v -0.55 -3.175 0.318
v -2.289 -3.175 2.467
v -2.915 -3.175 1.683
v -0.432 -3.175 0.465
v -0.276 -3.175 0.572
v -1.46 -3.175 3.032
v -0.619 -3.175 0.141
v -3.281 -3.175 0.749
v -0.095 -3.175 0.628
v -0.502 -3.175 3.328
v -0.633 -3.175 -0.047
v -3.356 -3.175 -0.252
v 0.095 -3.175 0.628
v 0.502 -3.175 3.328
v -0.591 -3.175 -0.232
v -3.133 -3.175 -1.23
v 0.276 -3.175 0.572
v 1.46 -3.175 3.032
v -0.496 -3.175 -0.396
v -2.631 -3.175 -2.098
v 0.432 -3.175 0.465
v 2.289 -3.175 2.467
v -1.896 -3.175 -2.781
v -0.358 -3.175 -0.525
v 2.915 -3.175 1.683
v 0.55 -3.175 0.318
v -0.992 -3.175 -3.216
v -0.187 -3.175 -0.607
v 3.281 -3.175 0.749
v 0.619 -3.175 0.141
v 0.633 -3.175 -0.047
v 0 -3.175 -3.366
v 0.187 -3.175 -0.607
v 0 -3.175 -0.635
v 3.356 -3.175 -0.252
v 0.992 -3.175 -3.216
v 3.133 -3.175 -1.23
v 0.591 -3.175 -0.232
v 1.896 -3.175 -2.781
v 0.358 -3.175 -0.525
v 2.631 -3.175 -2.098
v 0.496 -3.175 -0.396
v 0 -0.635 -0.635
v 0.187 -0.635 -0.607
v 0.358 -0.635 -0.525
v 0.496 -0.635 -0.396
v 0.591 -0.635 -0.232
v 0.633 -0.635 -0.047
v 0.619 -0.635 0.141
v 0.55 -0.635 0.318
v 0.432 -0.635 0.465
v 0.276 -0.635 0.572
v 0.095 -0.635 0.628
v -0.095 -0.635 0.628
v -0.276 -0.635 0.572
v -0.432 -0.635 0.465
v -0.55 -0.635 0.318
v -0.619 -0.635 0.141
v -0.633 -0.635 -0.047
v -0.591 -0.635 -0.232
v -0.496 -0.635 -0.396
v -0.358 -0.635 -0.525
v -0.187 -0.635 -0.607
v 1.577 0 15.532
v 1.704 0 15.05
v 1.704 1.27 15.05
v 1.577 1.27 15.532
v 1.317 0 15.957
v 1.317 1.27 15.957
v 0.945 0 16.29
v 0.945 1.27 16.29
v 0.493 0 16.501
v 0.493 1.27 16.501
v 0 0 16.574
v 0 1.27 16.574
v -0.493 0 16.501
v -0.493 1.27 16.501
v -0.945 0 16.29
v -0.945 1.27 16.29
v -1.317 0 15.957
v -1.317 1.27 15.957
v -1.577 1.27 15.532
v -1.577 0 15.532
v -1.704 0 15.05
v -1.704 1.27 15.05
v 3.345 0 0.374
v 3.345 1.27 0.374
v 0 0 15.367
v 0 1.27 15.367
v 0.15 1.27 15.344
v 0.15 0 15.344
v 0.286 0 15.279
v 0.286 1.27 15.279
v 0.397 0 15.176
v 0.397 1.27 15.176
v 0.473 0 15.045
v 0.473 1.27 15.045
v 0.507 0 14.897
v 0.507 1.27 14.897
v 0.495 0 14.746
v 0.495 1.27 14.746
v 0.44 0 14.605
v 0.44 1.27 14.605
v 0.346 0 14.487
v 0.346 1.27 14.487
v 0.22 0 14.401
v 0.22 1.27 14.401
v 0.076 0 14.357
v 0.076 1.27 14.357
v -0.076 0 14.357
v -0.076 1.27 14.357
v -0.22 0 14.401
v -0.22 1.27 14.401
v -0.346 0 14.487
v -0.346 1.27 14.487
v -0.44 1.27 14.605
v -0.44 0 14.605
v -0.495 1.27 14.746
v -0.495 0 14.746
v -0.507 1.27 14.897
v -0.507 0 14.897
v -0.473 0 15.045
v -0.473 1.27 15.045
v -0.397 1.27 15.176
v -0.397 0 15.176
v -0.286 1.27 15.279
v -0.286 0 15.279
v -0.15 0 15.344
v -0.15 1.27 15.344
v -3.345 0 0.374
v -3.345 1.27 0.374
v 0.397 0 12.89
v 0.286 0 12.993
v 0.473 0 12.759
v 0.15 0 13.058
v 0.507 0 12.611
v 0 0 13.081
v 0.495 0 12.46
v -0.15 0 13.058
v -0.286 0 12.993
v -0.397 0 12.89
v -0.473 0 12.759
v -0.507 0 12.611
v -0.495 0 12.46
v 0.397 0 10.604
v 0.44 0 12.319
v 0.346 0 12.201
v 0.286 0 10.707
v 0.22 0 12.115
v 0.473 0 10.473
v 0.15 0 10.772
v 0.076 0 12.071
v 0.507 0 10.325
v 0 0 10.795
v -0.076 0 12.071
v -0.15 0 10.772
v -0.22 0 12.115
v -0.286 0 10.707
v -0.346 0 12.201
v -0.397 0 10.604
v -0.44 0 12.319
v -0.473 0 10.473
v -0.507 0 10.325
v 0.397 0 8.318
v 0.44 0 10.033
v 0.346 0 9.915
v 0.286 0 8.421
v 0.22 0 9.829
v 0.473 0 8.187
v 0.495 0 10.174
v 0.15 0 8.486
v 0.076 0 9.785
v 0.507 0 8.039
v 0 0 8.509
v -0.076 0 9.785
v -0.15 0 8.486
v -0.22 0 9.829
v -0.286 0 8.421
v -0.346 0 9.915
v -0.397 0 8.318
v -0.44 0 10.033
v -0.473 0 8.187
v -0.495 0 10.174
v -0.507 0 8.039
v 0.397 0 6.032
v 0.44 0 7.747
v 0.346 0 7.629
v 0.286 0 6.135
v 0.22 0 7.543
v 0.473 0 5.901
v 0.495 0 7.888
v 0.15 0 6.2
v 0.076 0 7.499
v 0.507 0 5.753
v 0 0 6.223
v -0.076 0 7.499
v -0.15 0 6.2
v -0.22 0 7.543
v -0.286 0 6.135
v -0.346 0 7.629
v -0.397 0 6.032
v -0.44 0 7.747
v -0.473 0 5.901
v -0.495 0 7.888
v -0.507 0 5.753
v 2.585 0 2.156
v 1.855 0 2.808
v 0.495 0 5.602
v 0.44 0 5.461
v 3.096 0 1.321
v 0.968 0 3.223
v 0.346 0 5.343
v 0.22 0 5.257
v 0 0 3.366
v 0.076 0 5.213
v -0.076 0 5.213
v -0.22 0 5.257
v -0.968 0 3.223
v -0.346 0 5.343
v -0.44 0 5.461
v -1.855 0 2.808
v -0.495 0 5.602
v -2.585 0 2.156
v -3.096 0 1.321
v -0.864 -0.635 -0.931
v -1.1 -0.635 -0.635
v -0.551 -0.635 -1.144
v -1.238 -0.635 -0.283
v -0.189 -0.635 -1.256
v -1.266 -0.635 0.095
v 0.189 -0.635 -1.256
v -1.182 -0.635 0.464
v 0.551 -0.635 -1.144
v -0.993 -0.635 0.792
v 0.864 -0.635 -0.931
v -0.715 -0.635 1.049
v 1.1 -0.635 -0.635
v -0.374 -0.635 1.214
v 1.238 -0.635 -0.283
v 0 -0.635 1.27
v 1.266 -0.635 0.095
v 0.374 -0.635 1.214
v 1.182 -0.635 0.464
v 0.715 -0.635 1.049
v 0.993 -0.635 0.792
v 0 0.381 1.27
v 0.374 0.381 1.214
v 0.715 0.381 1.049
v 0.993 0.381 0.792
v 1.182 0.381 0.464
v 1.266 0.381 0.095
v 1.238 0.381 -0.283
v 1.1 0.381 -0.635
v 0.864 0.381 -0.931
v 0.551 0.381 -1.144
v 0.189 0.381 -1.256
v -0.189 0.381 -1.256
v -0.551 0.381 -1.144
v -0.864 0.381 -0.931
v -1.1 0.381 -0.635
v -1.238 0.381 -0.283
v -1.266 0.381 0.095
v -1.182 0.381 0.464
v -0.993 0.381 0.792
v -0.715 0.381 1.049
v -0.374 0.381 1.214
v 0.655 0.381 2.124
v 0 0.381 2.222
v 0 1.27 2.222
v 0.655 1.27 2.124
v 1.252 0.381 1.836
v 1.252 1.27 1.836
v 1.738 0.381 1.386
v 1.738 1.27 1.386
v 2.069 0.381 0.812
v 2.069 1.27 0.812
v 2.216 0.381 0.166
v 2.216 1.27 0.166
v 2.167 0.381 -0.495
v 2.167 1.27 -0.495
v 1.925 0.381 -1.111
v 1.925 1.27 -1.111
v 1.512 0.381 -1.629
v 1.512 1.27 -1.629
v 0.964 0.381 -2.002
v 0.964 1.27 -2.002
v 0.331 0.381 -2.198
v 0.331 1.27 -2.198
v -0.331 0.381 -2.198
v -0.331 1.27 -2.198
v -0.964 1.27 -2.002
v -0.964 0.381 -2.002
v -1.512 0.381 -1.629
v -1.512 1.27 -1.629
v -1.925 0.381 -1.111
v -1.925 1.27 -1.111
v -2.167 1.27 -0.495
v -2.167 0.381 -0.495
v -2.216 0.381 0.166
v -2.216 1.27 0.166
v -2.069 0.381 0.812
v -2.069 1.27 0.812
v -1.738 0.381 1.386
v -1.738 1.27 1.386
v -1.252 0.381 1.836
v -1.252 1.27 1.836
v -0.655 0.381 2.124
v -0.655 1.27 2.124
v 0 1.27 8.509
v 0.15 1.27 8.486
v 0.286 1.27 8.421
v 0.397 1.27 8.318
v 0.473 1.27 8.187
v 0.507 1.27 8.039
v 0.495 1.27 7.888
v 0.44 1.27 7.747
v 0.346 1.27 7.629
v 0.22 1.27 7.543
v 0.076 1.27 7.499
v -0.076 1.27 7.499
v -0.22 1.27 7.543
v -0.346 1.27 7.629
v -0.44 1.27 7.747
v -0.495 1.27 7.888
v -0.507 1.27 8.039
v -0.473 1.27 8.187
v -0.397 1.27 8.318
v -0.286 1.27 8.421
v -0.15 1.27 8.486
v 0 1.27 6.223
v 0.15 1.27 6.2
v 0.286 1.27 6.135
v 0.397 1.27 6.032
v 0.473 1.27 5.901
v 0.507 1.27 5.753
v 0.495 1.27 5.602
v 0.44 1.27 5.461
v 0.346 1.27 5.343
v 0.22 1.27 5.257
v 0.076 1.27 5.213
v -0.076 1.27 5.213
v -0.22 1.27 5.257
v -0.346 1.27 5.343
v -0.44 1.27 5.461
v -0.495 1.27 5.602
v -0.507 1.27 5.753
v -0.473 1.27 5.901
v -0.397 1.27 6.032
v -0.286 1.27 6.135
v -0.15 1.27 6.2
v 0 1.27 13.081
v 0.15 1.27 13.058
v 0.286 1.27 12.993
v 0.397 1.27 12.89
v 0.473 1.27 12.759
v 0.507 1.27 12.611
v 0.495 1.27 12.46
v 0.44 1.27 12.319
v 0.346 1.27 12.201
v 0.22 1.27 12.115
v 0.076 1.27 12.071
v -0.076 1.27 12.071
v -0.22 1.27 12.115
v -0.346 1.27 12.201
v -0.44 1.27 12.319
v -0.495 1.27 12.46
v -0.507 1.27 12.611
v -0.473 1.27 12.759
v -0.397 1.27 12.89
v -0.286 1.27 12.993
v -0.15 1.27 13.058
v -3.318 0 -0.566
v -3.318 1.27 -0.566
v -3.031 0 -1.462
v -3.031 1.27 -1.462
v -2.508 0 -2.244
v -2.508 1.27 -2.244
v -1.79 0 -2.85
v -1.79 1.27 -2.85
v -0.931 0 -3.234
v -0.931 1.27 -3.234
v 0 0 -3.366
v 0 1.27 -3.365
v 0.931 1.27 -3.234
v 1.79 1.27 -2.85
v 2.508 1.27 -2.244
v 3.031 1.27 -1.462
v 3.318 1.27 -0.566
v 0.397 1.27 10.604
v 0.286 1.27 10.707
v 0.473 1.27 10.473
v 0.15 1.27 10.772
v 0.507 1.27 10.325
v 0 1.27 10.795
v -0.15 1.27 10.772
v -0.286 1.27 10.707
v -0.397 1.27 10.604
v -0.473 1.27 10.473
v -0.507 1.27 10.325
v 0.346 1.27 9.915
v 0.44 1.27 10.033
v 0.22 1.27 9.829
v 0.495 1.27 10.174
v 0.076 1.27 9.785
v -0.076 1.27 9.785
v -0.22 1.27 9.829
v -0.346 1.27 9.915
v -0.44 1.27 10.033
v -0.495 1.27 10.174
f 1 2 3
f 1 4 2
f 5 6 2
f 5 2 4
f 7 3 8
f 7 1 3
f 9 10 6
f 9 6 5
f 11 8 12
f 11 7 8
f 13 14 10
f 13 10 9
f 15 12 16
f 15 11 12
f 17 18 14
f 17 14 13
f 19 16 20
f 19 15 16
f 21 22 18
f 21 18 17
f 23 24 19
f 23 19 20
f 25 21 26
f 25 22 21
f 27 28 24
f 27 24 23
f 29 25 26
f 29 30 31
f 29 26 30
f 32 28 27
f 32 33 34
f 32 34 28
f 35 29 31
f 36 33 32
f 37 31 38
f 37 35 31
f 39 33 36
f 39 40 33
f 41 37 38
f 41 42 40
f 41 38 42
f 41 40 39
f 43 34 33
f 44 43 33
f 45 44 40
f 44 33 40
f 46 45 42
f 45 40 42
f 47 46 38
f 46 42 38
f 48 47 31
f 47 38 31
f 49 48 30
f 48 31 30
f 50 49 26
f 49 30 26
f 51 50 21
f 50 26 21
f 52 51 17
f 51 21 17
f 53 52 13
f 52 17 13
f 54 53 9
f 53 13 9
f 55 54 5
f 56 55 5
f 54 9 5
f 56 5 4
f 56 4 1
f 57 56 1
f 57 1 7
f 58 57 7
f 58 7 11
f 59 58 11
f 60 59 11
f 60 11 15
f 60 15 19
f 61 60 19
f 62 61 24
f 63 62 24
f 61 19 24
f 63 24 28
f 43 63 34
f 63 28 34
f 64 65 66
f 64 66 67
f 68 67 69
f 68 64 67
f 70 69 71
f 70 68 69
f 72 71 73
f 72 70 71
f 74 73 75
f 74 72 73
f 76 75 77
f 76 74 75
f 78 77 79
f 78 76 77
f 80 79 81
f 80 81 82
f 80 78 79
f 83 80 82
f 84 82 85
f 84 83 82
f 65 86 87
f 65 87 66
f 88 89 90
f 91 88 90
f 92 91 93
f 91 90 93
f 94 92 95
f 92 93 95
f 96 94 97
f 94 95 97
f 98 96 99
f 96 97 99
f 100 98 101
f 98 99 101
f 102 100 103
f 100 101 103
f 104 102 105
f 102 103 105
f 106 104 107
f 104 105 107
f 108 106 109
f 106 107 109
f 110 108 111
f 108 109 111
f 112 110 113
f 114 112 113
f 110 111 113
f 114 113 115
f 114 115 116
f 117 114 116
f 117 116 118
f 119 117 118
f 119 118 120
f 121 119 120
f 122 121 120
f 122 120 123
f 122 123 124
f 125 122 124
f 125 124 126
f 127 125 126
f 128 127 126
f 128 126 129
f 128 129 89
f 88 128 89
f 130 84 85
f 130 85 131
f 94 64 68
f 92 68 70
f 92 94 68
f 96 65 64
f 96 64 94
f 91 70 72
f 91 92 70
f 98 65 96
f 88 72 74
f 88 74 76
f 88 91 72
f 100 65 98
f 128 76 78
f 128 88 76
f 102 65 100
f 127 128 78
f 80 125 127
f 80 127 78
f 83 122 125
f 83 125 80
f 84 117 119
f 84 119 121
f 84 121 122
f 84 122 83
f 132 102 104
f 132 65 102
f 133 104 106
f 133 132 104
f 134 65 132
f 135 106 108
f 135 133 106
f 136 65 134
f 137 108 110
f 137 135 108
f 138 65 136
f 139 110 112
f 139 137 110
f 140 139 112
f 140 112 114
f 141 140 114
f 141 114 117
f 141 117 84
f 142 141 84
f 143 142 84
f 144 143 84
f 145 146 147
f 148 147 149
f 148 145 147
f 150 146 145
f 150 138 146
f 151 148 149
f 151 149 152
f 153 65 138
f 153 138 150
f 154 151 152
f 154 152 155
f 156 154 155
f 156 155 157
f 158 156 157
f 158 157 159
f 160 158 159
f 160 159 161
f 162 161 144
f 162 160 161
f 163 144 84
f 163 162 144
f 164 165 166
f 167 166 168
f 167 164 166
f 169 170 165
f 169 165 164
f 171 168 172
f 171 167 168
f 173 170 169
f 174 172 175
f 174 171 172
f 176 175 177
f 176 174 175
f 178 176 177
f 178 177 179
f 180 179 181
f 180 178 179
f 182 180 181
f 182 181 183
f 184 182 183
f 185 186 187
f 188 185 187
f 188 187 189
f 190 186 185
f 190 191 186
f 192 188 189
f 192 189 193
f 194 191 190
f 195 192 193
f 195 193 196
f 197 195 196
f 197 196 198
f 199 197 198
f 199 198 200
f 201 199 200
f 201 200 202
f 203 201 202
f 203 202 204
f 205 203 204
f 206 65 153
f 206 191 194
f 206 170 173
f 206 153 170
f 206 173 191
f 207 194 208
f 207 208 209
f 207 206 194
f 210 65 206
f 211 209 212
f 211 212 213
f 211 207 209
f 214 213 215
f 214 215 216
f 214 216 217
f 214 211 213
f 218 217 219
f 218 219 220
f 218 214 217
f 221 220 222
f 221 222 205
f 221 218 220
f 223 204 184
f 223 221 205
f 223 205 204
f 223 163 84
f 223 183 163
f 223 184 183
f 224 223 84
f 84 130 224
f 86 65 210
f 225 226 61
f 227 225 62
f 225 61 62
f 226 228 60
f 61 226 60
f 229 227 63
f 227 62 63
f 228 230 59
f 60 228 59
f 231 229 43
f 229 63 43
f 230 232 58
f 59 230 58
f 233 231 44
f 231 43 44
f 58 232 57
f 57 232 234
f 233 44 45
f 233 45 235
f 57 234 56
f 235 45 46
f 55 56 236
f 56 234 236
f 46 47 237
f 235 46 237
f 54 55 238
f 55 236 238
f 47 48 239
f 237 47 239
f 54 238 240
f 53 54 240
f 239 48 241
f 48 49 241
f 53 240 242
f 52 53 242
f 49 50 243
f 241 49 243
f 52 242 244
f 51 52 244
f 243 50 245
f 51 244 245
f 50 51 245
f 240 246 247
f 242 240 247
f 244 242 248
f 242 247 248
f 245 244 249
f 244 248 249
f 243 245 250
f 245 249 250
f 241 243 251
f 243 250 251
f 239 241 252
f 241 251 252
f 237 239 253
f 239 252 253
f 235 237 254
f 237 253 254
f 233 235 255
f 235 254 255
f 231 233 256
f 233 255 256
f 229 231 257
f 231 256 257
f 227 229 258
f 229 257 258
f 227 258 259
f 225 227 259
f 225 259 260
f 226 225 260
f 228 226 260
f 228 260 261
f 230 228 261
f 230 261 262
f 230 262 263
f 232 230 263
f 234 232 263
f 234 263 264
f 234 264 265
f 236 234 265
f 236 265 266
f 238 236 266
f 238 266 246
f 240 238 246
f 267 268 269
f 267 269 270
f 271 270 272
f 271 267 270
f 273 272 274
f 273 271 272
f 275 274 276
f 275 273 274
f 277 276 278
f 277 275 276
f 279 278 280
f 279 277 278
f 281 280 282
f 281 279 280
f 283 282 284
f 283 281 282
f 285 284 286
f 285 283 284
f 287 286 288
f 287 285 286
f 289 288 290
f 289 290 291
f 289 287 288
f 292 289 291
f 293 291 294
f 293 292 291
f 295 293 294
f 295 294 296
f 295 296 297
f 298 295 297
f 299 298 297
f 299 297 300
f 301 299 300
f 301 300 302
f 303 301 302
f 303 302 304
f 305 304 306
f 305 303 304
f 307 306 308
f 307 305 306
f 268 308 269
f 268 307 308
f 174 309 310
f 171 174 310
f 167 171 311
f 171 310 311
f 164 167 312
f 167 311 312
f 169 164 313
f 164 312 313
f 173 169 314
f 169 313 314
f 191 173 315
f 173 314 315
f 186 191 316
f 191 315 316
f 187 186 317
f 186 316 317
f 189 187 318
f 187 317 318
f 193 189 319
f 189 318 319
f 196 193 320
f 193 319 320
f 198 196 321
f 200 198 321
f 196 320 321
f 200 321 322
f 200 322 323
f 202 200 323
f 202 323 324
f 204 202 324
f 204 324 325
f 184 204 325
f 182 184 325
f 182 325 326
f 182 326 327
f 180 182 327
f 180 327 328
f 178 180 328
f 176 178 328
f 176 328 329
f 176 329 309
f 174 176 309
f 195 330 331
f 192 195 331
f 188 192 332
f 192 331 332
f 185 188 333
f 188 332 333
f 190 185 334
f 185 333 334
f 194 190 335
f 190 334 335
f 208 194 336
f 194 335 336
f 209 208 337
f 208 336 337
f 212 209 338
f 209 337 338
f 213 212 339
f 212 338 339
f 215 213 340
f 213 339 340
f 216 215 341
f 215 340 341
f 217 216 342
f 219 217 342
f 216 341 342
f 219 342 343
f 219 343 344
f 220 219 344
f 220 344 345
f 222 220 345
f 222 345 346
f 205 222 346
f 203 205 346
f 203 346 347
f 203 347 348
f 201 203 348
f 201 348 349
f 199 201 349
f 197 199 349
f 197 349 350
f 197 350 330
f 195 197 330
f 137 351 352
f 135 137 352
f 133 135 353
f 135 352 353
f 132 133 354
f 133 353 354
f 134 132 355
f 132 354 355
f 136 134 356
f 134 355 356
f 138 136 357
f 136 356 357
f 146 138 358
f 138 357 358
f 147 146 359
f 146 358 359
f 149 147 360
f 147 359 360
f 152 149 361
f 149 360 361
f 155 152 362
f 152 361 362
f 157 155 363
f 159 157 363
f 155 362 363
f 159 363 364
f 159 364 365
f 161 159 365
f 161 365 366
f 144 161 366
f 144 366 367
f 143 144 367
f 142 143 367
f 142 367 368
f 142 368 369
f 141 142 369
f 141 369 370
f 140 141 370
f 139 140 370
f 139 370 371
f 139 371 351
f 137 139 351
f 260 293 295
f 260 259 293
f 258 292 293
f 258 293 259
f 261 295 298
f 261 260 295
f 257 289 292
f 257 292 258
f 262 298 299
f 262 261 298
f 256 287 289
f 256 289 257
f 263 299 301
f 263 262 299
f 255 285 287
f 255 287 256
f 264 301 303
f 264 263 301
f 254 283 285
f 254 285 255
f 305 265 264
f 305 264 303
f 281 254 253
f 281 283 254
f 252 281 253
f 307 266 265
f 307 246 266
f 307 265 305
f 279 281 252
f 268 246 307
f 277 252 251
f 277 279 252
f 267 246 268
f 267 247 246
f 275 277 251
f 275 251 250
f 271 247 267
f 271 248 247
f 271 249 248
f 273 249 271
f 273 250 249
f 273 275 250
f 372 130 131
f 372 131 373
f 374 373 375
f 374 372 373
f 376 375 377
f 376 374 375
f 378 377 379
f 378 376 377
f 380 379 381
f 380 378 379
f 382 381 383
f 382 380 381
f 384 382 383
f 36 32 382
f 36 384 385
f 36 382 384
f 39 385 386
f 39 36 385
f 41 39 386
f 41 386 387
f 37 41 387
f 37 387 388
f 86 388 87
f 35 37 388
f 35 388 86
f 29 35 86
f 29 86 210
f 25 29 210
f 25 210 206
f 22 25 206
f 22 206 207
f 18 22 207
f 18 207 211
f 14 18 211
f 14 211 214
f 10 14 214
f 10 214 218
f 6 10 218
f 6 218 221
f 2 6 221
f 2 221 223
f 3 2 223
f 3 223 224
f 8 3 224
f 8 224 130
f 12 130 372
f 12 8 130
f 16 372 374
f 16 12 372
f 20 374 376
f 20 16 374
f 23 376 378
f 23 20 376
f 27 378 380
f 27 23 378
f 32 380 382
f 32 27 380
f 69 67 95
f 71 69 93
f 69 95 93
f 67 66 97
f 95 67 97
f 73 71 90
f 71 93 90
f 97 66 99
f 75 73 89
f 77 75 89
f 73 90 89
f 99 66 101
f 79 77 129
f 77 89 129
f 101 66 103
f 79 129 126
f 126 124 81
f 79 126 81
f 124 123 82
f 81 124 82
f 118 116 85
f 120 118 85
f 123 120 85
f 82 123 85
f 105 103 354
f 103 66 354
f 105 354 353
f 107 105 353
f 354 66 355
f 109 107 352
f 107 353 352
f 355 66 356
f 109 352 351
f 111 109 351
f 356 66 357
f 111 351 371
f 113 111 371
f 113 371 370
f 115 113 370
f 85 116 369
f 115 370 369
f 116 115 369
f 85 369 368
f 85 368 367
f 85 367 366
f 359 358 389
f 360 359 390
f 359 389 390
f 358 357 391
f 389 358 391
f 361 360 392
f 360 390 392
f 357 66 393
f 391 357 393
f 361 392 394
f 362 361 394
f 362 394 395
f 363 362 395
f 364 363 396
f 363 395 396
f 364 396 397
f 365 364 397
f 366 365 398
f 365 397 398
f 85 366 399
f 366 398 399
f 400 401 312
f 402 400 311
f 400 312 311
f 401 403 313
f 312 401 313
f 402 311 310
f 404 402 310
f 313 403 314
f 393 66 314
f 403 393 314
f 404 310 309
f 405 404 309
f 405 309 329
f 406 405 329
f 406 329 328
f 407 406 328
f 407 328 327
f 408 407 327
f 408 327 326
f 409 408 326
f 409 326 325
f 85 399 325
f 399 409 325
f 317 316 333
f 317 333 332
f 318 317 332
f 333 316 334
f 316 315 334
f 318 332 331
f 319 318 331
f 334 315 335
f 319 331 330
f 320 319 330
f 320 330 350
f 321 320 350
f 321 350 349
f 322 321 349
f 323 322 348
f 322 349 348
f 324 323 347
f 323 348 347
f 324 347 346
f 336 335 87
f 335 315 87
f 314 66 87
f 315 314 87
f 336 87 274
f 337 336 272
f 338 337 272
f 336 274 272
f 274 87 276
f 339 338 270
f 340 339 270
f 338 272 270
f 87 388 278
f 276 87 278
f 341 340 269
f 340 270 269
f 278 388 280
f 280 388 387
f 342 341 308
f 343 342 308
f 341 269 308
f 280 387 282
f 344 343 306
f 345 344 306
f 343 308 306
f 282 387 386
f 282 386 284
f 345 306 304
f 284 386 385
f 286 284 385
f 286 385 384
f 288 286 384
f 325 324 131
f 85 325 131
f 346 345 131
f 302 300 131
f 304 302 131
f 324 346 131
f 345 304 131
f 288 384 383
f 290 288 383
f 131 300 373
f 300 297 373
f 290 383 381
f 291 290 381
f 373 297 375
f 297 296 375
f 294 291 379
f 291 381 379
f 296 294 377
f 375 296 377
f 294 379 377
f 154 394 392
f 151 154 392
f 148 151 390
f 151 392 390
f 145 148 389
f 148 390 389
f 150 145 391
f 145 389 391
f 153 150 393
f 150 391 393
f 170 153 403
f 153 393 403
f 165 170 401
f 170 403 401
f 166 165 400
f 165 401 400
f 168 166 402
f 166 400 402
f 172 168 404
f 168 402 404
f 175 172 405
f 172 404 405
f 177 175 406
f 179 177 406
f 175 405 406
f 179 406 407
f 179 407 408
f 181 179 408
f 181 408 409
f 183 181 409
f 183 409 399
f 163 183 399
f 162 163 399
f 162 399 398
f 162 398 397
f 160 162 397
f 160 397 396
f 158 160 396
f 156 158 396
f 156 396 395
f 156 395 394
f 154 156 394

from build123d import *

# Parameters (mm, degrees)
BOSS_EXTRUDE1_DEPTH = 1.27
BOSS_EXTRUDE2_START = 3.175
SKETCH2_R           = 3.3655
BOSS_EXTRUDE2_DEPTH = 3.175
CUT_EXTRUDE1_DEPTH  = 2.286
CUT_EXTRUDE2_START  = -0.889
SKETCH4_R           = 2.2225
CUT_EXTRUDE2_DEPTH  = 0.889
CUT_EXTRUDE3_REACH  = 19.282
SKETCH5_R           = 1.27
CUT_EXTRUDE4_REACH  = 19.486
SKETCH6_R           = 0.508
SKETCH7_R           = 2.54
SKETCH7_R_2         = 0.635
BOSS_EXTRUDE3_DEPTH = 2.54


with BuildPart() as part:
    # Sketch1 → Boss-Extrude1 (new body)
    with BuildSketch(Plane(origin=(0, 0, 0), x_dir=(1, 0, 0), z_dir=(0, 1, 0))):
        with BuildLine():
            Line((-1.703883799, -15.0495), (-3.34466079, -0.373944444))
            ThreePointArc((-3.34466079, -0.373944444), (0, 3.3655), (3.34466079, -0.373944444))
            Line((3.34466079, -0.373944444), (1.703883799, -15.0495))
            ThreePointArc((1.703883799, -15.0495), (0, -16.5735), (-1.703883799, -15.0495))
        make_face()
    extrude(amount=BOSS_EXTRUDE1_DEPTH)

    # Sketch2 → Boss-Extrude2 (add)
    with BuildSketch(Plane.XZ.offset(BOSS_EXTRUDE2_START)):
        with Locations(Location((0, 0, 0), (0, 0, 270))):
            Circle(SKETCH2_R)
    extrude(amount=-BOSS_EXTRUDE2_DEPTH)

    # Sketch3 → Cut-Extrude1 (cut)
    with BuildSketch(Plane(origin=(0, -3.175, 0), x_dir=(-1, 0, 0), z_dir=(0, -1, 0))):
        with BuildLine():
            Line((0.344662185, 2.452398872), (0.160511142, 2.216696286))
            ThreePointArc((0.160511142, 2.216696286), (0.155033763, 2.217086102), (0.149555438, 2.217462383))
            Line((0.149555438, 2.217462383), (0, 2.4765))
            Line((0, 2.4765), (-0.149555438, 2.217462383))
            ThreePointArc((-0.149555438, 2.217462383), (-0.155033763, 2.217086102), (-0.160511142, 2.216696286))
            Line((-0.160511142, 2.216696286), (-0.344662185, 2.452398872))
            Line((-0.344662185, 2.452398872), (-0.456711091, 2.175068098))
            ThreePointArc((-0.456711091, 2.175068098), (-0.462083733, 2.173933043), (-0.467453554, 2.172784717))
            Line((-0.467453554, 2.172784717), (-0.682615912, 2.38056459))
            Line((-0.682615912, 2.38056459), (-0.754977382, 2.090338586))
            ThreePointArc((-0.754977382, 2.090338586), (-0.760139769, 2.08846685), (-0.765297515, 2.086582364))
            Line((-0.765297515, 2.086582364), (-1.007283297, 2.262395326))
            Line((-1.007283297, 2.262395326), (-1.038548897, 1.964923011))
            ThreePointArc((-1.038548897, 1.964923011), (-1.043400548, 1.962351025), (-1.04824583, 1.95976706))
            Line((-1.04824583, 1.95976706), (-1.312345058, 2.10019111))
            Line((-1.312345058, 2.10019111), (-1.301906239, 1.801262445))
            ThreePointArc((-1.301906239, 1.801262445), (-1.306352723, 1.79804027), (-1.310791233, 1.794807119))
            Line((-1.310791233, 1.794807119), (-1.591863515, 1.897109063))
            Line((-1.591863515, 1.897109063), (-1.539923457, 1.602542354))
            ThreePointArc((-1.539923457, 1.602542354), (-1.543878228, 1.598732706), (-1.547823575, 1.594913299))
            Line((-1.547823575, 1.594913299), (-1.84039816, 1.657101947))
            Line((-1.84039816, 1.657101947), (-1.747967817, 1.372630599))
            ThreePointArc((-1.747967817, 1.372630599), (-1.7513539, 1.368307629), (-1.754729292, 1.363976306))
            Line((-1.754729292, 1.363976306), (-2.053111548, 1.384841225))
            Line((-2.053111548, 1.384841225), (-1.921989971, 1.116002151))
            ThreePointArc((-1.921989971, 1.116002151), (-1.92474146, 1.11125), (-1.927481199, 1.106491065))
            Line((-1.927481199, 1.106491065), (-2.225863456, 1.085626145))
            Line((-2.225863456, 1.085626145), (-2.058602777, 0.837651991))
            ThreePointArc((-2.058602777, 0.837651991), (-2.060666117, 0.832563154), (-2.062716877, 0.827469234))
            Line((-2.062716877, 0.827469234), (-2.355291463, 0.765280587))
            Line((-2.355291463, 0.765280587), (-2.155147221, 0.542997887))
            ThreePointArc((-2.155147221, 0.542997887), (-2.156482252, 0.537671413), (-2.157804118, 0.532341657))
            Line((-2.157804118, 0.532341657), (-2.4388764, 0.430039712))
            Line((-2.4388764, 0.430039712), (-2.209744176, 0.237774947))
            ThreePointArc((-2.209744176, 0.237774947), (-2.210324912, 0.23231451), (-2.210892156, 0.226852654))
            Line((-2.210892156, 0.226852654), (-2.474991383, 0.086428604))
            Line((-2.474991383, 0.086428604), (-2.221330975, -0.072076012))
            ThreePointArc((-2.221330975, -0.072076012), (-2.221146113, -0.077564131), (-2.220947692, -0.083051778))
            Line((-2.220947692, -0.083051778), (-2.462933474, -0.258864739))
            Line((-2.462933474, -0.258864739), (-2.189682092, -0.380524093))
            ThreePointArc((-2.189682092, -0.380524093), (-2.188735231, -0.385933075), (-2.187775009, -0.391339701))
            Line((-2.187775009, -0.391339701), (-2.402937366, -0.599119574))
            Line((-2.402937366, -0.599119574), (-2.115413539, -0.681565705))
            ThreePointArc((-2.115413539, -0.681565705), (-2.113723107, -0.68679027), (-2.112019773, -0.692010642))
            Line((-2.112019773, -0.692010642), (-2.296170816, -0.927713229))
            Line((-2.296170816, -0.927713229), (-1.999970867, -0.969341417))
            ThreePointArc((-1.999970867, -0.969341417), (-1.997569768, -0.974279874), (-1.995156475, -0.979212383))
            Line((-1.995156475, -0.979212383), (-2.144711912, -1.23825))
            Line((-2.144711912, -1.23825), (-1.845601037, -1.23825))
            ThreePointArc((-1.845601037, -1.23825), (-1.842536005, -1.242806228), (-1.839459725, -1.247354869))
            Line((-1.839459725, -1.247354869), (-1.951508631, -1.524685644))
            Line((-1.951508631, -1.524685644), (-1.655308682, -1.483057456))
            ThreePointArc((-1.655308682, -1.483057456), (-1.651639375, -1.487142773), (-1.647959984, -1.491219011))
            Line((-1.647959984, -1.491219011), (-1.720321454, -1.781445016))
            Line((-1.720321454, -1.781445016), (-1.432797627, -1.698998885))
            ThreePointArc((-1.432797627, -1.698998885), (-1.428595463, -1.702533775), (-1.424384577, -1.706058272))
            Line((-1.424384577, -1.706058272), (-1.455650177, -2.003530587))
            Line((-1.455650177, -2.003530587), (-1.182398796, -1.881871233))
            ThreePointArc((-1.182398796, -1.881871233), (-1.177745565, -1.884786894), (-1.173085144, -1.887691048))
            Line((-1.173085144, -1.887691048), (-1.162646325, -2.186619714))
            Line((-1.162646325, -2.186619714), (-0.908985917, -2.028115099))
            ThreePointArc((-0.908985917, -2.028115099), (-0.903972189, -2.03035478), (-0.898952943, -2.032582066))
            Line((-0.898952943, -2.032582066), (-0.847012885, -2.327148775))
            Line((-0.847012885, -2.327148775), (-0.617880661, -2.134884011))
            ThreePointArc((-0.617880661, -2.134884011), (-0.612604023, -2.136404119), (-0.607323646, -2.137911186))
            Line((-0.607323646, -2.137911186), (-0.514893302, -2.422382533))
            Line((-0.514893302, -2.422382533), (-0.314749061, -2.200099834))
            ThreePointArc((-0.314749061, -2.200099834), (-0.309312217, -2.200870783), (-0.303873485, -2.201628296))
            Line((-0.303873485, -2.201628296), (-0.172751907, -2.47046737))
            Line((-0.172751907, -2.47046737), (-0.005491228, -2.222493216))
            ThreePointArc((-0.005491228, -2.222493216), (0, -2.2225), (0.005491228, -2.222493216))
            Line((0.005491228, -2.222493216), (0.172751907, -2.47046737))
            Line((0.172751907, -2.47046737), (0.303873485, -2.201628296))
            ThreePointArc((0.303873485, -2.201628296), (0.309312217, -2.200870783), (0.314749061, -2.200099834))
            Line((0.314749061, -2.200099834), (0.514893302, -2.422382533))
            Line((0.514893302, -2.422382533), (0.607323646, -2.137911186))
            ThreePointArc((0.607323646, -2.137911186), (0.612604023, -2.136404119), (0.617880661, -2.134884011))
            Line((0.617880661, -2.134884011), (0.847012885, -2.327148775))
            Line((0.847012885, -2.327148775), (0.898952943, -2.032582066))
            ThreePointArc((0.898952943, -2.032582066), (0.903972189, -2.03035478), (0.908985917, -2.028115099))
            Line((0.908985917, -2.028115099), (1.162646325, -2.186619714))
            Line((1.162646325, -2.186619714), (1.173085144, -1.887691048))
            ThreePointArc((1.173085144, -1.887691048), (1.177745565, -1.884786894), (1.182398796, -1.881871233))
            Line((1.182398796, -1.881871233), (1.455650177, -2.003530587))
            Line((1.455650177, -2.003530587), (1.424384577, -1.706058272))
            ThreePointArc((1.424384577, -1.706058272), (1.428595463, -1.702533775), (1.432797627, -1.698998885))
            Line((1.432797627, -1.698998885), (1.720321454, -1.781445016))
            Line((1.720321454, -1.781445016), (1.647959984, -1.491219011))
            ThreePointArc((1.647959984, -1.491219011), (1.651639375, -1.487142773), (1.655308682, -1.483057456))
            Line((1.655308682, -1.483057456), (1.951508631, -1.524685644))
            Line((1.951508631, -1.524685644), (1.839459725, -1.247354869))
            ThreePointArc((1.839459725, -1.247354869), (1.842536005, -1.242806228), (1.845601037, -1.23825))
            Line((1.845601037, -1.23825), (2.144711912, -1.23825))
            Line((2.144711912, -1.23825), (1.995156475, -0.979212383))
            ThreePointArc((1.995156475, -0.979212383), (1.997569768, -0.974279874), (1.999970867, -0.969341417))
            Line((1.999970867, -0.969341417), (2.296170816, -0.927713229))
            Line((2.296170816, -0.927713229), (2.112019773, -0.692010642))
            ThreePointArc((2.112019773, -0.692010642), (2.113723107, -0.68679027), (2.115413539, -0.681565705))
            Line((2.115413539, -0.681565705), (2.402937366, -0.599119574))
            Line((2.402937366, -0.599119574), (2.187775009, -0.391339701))
            ThreePointArc((2.187775009, -0.391339701), (2.188735231, -0.385933075), (2.189682092, -0.380524093))
            Line((2.189682092, -0.380524093), (2.462933474, -0.258864739))
            Line((2.462933474, -0.258864739), (2.220947692, -0.083051778))
            ThreePointArc((2.220947692, -0.083051778), (2.221146113, -0.077564131), (2.221330975, -0.072076012))
            Line((2.221330975, -0.072076012), (2.474991383, 0.086428604))
            Line((2.474991383, 0.086428604), (2.210892156, 0.226852654))
            ThreePointArc((2.210892156, 0.226852654), (2.210324912, 0.23231451), (2.209744176, 0.237774947))
            Line((2.209744176, 0.237774947), (2.4388764, 0.430039712))
            Line((2.4388764, 0.430039712), (2.157804118, 0.532341657))
            ThreePointArc((2.157804118, 0.532341657), (2.156482252, 0.537671413), (2.155147221, 0.542997887))
            Line((2.155147221, 0.542997887), (2.355291463, 0.765280587))
            Line((2.355291463, 0.765280587), (2.062716877, 0.827469234))
            ThreePointArc((2.062716877, 0.827469234), (2.060666117, 0.832563154), (2.058602777, 0.837651991))
            Line((2.058602777, 0.837651991), (2.225863456, 1.085626145))
            Line((2.225863456, 1.085626145), (1.927481199, 1.106491065))
            ThreePointArc((1.927481199, 1.106491065), (1.92474146, 1.11125), (1.921989971, 1.116002151))
            Line((1.921989971, 1.116002151), (2.053111548, 1.384841225))
            Line((2.053111548, 1.384841225), (1.754729292, 1.363976306))
            ThreePointArc((1.754729292, 1.363976306), (1.7513539, 1.368307629), (1.747967817, 1.372630599))
            Line((1.747967817, 1.372630599), (1.84039816, 1.657101947))
            Line((1.84039816, 1.657101947), (1.547823575, 1.594913299))
            ThreePointArc((1.547823575, 1.594913299), (1.543878228, 1.598732706), (1.539923457, 1.602542354))
            Line((1.539923457, 1.602542354), (1.591863515, 1.897109063))
            Line((1.591863515, 1.897109063), (1.310791233, 1.794807119))
            ThreePointArc((1.310791233, 1.794807119), (1.306352723, 1.79804027), (1.301906239, 1.801262445))
            Line((1.301906239, 1.801262445), (1.312345058, 2.10019111))
            Line((1.312345058, 2.10019111), (1.04824583, 1.95976706))
            ThreePointArc((1.04824583, 1.95976706), (1.043400548, 1.962351025), (1.038548897, 1.964923011))
            Line((1.038548897, 1.964923011), (1.007283297, 2.262395326))
            Line((1.007283297, 2.262395326), (0.765297515, 2.086582364))
            ThreePointArc((0.765297515, 2.086582364), (0.760139769, 2.08846685), (0.754977382, 2.090338586))
            Line((0.754977382, 2.090338586), (0.682615912, 2.38056459))
            Line((0.682615912, 2.38056459), (0.467453554, 2.172784717))
            ThreePointArc((0.467453554, 2.172784717), (0.462083733, 2.173933043), (0.456711091, 2.175068098))
            Line((0.456711091, 2.175068098), (0.344662185, 2.452398872))
        make_face()
    extrude(amount=-CUT_EXTRUDE1_DEPTH, mode=Mode.SUBTRACT)

    # Sketch4 → Cut-Extrude2 (cut)
    with BuildSketch(Plane(origin=(0, 1.27, 0), x_dir=(1, 0, 0), z_dir=(0, 1, 0)).offset(CUT_EXTRUDE2_START)):
        with Locations(Location((0, 0, 0), (0, 0, 270))):
            Circle(SKETCH4_R)
    extrude(amount=CUT_EXTRUDE2_DEPTH, mode=Mode.SUBTRACT)

    # Sketch5 → Cut-Extrude3 (cut, up to next)
    with BuildSketch(Plane(origin=(0, 0.381, 0), x_dir=(1, 0, 0), z_dir=(0, 1, 0)), mode=Mode.PRIVATE) as cut_extrude3_sk1:
        with Locations(Location((0, 0, 0), (0, 0, 270))):
            Circle(SKETCH5_R)
    cut_extrude3_tool1 = extrude(cut_extrude3_sk1.sketch, amount=-CUT_EXTRUDE3_REACH, mode=Mode.PRIVATE) & part.part
    add(cut_extrude3_tool1.solids().sort_by_distance((0, 0.381, 0))[0], mode=Mode.SUBTRACT)

    # Sketch6 → Cut-Extrude4 (cut, up to next)
    with BuildSketch(Plane(origin=(0, 1.27, 0), x_dir=(1, 0, 0), z_dir=(0, 1, 0)), mode=Mode.PRIVATE) as cut_extrude4_sk1:
        with Locations(Location((0, -14.859, 0), (0, 0, 270))):
            Circle(SKETCH6_R)
    cut_extrude4_tool1 = extrude(cut_extrude4_sk1.sketch, amount=-CUT_EXTRUDE4_REACH, mode=Mode.PRIVATE) & part.part
    # Sketch6 → Cut-Extrude4 (cut, up to next)
    with BuildSketch(Plane(origin=(0, 1.27, 0), x_dir=(1, 0, 0), z_dir=(0, 1, 0)), mode=Mode.PRIVATE) as cut_extrude4_sk2:
        with Locations(Location((0, -12.573, 0), (0, 0, 270))):
            Circle(SKETCH6_R)
    cut_extrude4_tool2 = extrude(cut_extrude4_sk2.sketch, amount=-CUT_EXTRUDE4_REACH, mode=Mode.PRIVATE) & part.part
    # Sketch6 → Cut-Extrude4 (cut, up to next)
    with BuildSketch(Plane(origin=(0, 1.27, 0), x_dir=(1, 0, 0), z_dir=(0, 1, 0)), mode=Mode.PRIVATE) as cut_extrude4_sk3:
        with Locations(Location((0, -10.287, 0), (0, 0, 270))):
            Circle(SKETCH6_R)
    cut_extrude4_tool3 = extrude(cut_extrude4_sk3.sketch, amount=-CUT_EXTRUDE4_REACH, mode=Mode.PRIVATE) & part.part
    # Sketch6 → Cut-Extrude4 (cut, up to next)
    with BuildSketch(Plane(origin=(0, 1.27, 0), x_dir=(1, 0, 0), z_dir=(0, 1, 0)), mode=Mode.PRIVATE) as cut_extrude4_sk4:
        with Locations(Location((0, -8.001, 0), (0, 0, 270))):
            Circle(SKETCH6_R)
    cut_extrude4_tool4 = extrude(cut_extrude4_sk4.sketch, amount=-CUT_EXTRUDE4_REACH, mode=Mode.PRIVATE) & part.part
    # Sketch6 → Cut-Extrude4 (cut, up to next)
    with BuildSketch(Plane(origin=(0, 1.27, 0), x_dir=(1, 0, 0), z_dir=(0, 1, 0)), mode=Mode.PRIVATE) as cut_extrude4_sk5:
        with Locations(Location((0, -5.715, 0), (0, 0, 270))):
            Circle(SKETCH6_R)
    cut_extrude4_tool5 = extrude(cut_extrude4_sk5.sketch, amount=-CUT_EXTRUDE4_REACH, mode=Mode.PRIVATE) & part.part
    add(cut_extrude4_tool1.solids().sort_by_distance((0, 1.27, 14.859))[0], mode=Mode.SUBTRACT)
    add(cut_extrude4_tool2.solids().sort_by_distance((0, 1.27, 12.573))[0], mode=Mode.SUBTRACT)
    add(cut_extrude4_tool3.solids().sort_by_distance((0, 1.27, 10.287))[0], mode=Mode.SUBTRACT)
    add(cut_extrude4_tool4.solids().sort_by_distance((0, 1.27, 8.001))[0], mode=Mode.SUBTRACT)
    add(cut_extrude4_tool5.solids().sort_by_distance((0, 1.27, 5.715))[0], mode=Mode.SUBTRACT)

    # Sketch7 → Boss-Extrude3 (add)
    with BuildSketch(Plane.XZ.offset(3.175)):
        Circle(SKETCH7_R)
        with Locations(Location((0, 0, 0), (0, 0, 270))):
            Circle(SKETCH7_R_2, mode=Mode.SUBTRACT)
    extrude(amount=-BOSS_EXTRUDE3_DEPTH)


solid = part.part
